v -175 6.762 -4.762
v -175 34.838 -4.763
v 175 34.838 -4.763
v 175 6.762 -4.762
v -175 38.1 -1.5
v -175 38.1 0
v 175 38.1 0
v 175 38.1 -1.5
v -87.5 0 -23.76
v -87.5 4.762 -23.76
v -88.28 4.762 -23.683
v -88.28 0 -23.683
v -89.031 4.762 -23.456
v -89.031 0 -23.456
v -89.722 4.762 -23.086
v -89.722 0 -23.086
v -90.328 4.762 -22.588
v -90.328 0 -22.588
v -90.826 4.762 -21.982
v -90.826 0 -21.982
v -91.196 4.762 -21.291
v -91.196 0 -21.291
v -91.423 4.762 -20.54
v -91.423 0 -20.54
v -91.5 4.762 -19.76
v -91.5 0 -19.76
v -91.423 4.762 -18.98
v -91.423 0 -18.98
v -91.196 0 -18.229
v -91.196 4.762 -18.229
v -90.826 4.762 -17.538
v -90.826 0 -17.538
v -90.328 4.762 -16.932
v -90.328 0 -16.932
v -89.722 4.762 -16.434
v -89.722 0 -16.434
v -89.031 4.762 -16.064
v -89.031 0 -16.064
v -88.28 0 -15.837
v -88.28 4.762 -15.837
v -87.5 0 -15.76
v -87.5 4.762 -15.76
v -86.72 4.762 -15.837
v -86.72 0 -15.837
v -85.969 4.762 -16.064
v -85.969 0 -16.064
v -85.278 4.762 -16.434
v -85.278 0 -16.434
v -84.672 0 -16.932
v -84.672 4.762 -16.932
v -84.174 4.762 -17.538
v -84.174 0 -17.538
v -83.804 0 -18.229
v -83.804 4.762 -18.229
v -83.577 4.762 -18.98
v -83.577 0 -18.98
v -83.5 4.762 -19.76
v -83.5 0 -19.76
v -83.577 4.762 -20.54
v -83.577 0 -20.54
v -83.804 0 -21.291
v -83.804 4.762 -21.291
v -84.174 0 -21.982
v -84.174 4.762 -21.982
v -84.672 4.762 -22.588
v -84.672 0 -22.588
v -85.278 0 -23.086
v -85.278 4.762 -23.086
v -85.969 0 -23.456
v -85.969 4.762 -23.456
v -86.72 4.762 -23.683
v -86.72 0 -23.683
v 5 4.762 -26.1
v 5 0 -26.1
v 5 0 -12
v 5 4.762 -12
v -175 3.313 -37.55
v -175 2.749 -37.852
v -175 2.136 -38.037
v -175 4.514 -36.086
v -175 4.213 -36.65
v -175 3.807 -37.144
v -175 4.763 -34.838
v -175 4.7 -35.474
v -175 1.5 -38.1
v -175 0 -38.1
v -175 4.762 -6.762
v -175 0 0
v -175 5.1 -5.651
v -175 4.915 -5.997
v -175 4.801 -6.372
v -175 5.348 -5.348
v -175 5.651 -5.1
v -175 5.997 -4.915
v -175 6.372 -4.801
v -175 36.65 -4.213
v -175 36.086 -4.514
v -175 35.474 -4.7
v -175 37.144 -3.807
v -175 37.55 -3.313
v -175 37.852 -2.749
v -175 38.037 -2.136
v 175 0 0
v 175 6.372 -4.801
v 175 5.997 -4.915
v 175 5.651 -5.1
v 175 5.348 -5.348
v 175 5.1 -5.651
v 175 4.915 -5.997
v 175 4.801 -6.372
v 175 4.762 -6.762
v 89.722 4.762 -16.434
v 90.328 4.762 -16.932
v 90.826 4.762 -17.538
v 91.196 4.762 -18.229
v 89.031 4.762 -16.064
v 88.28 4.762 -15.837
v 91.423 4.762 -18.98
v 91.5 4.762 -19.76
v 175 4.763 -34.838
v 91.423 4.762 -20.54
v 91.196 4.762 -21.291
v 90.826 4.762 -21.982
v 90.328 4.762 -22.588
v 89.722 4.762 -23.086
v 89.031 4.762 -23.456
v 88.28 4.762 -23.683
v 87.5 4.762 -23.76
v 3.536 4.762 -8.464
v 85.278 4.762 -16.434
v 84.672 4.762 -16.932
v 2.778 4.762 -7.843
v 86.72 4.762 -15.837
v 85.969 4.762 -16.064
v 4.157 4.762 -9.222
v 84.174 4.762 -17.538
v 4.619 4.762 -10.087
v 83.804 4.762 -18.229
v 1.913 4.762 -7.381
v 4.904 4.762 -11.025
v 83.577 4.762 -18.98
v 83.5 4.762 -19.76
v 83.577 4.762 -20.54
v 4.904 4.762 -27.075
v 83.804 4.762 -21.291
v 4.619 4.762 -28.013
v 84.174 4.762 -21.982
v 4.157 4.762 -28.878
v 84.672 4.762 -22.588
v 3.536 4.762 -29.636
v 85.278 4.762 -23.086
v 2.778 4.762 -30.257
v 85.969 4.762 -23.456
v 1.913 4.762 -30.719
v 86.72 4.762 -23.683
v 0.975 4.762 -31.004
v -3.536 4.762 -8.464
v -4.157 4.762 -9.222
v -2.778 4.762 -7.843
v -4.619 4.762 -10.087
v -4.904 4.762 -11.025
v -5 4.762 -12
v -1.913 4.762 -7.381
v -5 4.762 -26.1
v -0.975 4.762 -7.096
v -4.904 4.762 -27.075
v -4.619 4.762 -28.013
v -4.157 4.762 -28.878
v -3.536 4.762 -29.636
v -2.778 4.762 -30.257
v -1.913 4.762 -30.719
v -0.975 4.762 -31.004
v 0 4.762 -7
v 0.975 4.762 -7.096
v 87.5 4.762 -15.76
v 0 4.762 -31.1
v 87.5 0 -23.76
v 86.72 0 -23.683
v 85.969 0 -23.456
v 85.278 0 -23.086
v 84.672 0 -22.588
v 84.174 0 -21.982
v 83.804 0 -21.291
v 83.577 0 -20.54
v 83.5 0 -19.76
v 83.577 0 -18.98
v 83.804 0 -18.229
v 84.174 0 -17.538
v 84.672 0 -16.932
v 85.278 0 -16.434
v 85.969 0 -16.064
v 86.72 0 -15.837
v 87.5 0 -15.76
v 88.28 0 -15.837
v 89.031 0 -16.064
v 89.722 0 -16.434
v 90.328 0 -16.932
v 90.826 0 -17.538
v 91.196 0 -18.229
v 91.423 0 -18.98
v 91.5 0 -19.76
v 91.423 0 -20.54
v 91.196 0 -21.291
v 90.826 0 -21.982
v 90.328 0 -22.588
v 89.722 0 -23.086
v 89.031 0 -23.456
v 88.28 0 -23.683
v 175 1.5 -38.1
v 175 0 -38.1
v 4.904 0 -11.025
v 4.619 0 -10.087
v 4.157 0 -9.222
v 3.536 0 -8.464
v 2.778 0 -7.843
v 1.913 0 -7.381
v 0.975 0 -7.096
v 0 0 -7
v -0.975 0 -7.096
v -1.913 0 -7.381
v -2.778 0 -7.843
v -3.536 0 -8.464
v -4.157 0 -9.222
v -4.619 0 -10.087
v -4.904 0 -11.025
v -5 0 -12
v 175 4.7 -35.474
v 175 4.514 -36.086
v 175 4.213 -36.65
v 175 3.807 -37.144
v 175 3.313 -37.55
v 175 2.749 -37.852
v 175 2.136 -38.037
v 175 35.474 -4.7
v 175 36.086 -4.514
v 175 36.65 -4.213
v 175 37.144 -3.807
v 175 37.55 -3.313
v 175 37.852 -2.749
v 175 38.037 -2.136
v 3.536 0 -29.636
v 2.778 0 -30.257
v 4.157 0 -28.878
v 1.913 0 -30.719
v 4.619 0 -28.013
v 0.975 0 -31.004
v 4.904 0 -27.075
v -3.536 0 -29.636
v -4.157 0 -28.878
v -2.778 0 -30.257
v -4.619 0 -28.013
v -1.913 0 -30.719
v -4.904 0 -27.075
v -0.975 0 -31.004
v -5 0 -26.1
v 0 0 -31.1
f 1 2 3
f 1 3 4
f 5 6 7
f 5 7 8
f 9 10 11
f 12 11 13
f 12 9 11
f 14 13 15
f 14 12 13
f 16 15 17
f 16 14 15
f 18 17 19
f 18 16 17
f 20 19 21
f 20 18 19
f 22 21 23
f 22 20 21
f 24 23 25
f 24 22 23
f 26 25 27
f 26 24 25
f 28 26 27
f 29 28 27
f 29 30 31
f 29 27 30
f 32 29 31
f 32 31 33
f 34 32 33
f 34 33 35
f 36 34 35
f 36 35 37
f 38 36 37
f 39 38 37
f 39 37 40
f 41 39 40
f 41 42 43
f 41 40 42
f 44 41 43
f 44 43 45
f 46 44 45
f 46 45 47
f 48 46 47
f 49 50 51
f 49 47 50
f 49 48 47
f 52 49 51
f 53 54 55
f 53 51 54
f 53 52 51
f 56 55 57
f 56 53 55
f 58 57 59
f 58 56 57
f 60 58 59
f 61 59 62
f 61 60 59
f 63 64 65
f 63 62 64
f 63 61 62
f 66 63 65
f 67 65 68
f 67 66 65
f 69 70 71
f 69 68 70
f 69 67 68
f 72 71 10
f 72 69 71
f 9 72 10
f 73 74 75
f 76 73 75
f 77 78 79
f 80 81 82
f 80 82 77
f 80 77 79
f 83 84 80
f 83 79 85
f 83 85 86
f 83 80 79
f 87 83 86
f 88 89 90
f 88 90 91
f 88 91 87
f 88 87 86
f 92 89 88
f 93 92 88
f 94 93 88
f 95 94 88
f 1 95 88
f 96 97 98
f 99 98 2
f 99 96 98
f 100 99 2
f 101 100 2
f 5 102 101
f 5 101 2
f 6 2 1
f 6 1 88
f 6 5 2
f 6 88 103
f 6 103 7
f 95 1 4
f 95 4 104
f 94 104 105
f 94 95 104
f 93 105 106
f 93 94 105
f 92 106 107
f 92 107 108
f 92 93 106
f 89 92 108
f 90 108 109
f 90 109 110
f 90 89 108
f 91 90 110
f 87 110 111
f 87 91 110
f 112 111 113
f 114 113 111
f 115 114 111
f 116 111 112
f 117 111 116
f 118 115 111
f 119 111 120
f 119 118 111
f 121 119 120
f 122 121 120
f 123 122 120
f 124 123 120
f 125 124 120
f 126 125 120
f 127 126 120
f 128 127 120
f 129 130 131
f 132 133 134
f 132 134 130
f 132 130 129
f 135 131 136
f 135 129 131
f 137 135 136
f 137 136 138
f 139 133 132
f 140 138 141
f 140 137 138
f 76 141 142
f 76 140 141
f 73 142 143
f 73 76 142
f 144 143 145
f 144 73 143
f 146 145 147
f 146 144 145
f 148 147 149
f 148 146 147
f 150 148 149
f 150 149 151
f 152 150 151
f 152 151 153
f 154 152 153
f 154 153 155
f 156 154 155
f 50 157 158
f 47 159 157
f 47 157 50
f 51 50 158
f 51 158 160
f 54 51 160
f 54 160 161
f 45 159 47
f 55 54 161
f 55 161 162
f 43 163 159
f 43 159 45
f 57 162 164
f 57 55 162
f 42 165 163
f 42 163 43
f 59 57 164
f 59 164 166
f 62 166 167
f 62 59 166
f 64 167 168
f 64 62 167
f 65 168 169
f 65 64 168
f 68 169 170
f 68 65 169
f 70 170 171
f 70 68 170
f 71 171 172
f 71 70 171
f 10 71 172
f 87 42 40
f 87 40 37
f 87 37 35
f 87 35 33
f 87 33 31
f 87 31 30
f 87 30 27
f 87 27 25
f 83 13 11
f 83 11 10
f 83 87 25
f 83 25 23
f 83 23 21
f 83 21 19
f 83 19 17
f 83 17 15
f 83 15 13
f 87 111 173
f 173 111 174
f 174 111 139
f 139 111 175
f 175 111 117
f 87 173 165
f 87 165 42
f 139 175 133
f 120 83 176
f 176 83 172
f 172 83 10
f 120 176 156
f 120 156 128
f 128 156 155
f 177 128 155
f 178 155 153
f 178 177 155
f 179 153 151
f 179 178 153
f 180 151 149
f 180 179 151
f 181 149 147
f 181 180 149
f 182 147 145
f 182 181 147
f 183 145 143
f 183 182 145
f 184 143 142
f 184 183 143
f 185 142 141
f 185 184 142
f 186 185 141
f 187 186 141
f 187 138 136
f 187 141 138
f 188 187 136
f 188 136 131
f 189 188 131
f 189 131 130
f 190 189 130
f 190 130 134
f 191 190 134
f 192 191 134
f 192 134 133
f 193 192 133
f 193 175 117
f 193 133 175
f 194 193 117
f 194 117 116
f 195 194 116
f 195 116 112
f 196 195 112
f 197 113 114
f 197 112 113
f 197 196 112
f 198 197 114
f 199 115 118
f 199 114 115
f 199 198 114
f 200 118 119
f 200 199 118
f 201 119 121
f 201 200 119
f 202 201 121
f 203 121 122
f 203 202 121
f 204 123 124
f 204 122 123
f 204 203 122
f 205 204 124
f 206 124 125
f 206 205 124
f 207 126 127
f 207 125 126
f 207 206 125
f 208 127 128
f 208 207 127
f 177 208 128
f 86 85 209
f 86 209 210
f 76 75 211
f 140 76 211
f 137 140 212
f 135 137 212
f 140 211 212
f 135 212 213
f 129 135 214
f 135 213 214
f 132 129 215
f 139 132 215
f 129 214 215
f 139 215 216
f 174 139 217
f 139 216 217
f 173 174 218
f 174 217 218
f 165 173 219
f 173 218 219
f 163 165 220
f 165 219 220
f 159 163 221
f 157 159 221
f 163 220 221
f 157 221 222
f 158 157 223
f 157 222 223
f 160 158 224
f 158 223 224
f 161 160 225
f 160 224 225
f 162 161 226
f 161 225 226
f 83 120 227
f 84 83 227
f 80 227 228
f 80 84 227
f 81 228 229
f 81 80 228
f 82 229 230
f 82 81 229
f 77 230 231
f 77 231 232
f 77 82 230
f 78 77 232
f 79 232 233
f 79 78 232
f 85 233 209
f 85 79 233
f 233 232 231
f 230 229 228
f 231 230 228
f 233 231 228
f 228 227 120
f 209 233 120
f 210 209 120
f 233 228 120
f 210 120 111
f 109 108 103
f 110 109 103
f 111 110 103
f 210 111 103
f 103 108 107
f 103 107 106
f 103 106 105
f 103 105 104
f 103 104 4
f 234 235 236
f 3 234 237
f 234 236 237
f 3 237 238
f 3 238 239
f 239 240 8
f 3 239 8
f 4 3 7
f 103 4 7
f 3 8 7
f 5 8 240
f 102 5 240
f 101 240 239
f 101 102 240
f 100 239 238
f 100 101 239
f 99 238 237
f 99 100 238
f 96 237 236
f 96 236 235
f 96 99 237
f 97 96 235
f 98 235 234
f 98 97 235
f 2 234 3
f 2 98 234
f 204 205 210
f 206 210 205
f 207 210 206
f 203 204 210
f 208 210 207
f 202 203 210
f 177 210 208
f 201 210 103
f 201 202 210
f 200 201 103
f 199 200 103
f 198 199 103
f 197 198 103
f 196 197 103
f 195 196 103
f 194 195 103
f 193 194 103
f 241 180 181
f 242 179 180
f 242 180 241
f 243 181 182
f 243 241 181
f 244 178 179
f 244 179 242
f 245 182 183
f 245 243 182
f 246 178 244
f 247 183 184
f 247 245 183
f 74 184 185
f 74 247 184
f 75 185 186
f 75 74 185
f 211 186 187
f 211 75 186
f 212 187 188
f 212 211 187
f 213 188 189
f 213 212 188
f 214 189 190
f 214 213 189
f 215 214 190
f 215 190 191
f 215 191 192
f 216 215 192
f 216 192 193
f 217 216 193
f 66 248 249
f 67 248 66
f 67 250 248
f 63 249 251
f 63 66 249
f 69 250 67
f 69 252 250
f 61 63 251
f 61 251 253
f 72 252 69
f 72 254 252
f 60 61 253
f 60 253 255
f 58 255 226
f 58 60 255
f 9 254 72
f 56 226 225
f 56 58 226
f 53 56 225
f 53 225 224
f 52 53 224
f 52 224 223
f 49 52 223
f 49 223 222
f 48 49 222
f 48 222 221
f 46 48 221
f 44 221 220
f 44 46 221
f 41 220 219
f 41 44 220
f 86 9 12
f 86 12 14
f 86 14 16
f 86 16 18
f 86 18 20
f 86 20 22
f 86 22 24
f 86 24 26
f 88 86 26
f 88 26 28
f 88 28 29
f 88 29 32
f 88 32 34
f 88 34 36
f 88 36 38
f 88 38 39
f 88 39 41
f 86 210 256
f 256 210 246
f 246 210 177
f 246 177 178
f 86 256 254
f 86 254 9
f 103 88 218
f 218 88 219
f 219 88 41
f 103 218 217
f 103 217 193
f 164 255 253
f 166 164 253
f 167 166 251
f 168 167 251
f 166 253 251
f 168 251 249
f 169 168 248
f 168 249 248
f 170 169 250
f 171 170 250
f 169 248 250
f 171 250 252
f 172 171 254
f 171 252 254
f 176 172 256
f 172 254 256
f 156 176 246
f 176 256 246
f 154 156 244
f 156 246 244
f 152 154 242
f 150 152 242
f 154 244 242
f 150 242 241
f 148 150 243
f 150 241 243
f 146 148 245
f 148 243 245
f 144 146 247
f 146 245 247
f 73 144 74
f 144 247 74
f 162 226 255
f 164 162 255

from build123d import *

# Parameters (mm, degrees)
A_O_CANTONEIRA_LAMINADA_1020_3_16X1_1_2_DEPTH = 350
ESBO_O4_R                                     = 4
CORTE_EXTRUS_O1_DEPTH                         = 184.107127114


with BuildPart() as part:
    # Sketch11 → Aço cantoneira laminada 1020 3-16X1-1-2(1) (new body)
    with BuildSketch(Plane(origin=(-175, 0, 0), x_dir=(0, 0, -1), z_dir=(1, 0, 0))):
        with BuildLine():
            Line((0, 0), (0, 38.1))
            Line((0, 38.1), (1.5, 38.1))
            ThreePointArc((1.5, 38.1), (3.806935874, 37.144435874), (4.7625, 34.8375))
            Line((4.7625, 34.8375), (4.7625, 6.7625))
            ThreePointArc((4.7625, 6.7625), (5.348286438, 5.348286438), (6.7625, 4.7625))
            Line((6.7625, 4.7625), (34.8375, 4.7625))
            ThreePointArc((34.8375, 4.7625), (37.144435874, 3.806935874), (38.1, 1.5))
            Line((38.1, 1.5), (38.1, 0))
            Line((38.1, 0), (0, 0))
        make_face()
    extrude(amount=A_O_CANTONEIRA_LAMINADA_1020_3_16X1_1_2_DEPTH)

    # Esboço4 → Corte-extrusão1 (cut, through all)
    with BuildSketch(Plane(origin=(0, 0, 0), x_dir=(1, 0, 0), z_dir=(0, 1, 0))):
        with Locations(Location((-87.5, 19.76, 0), (0, 0, 90))):
            Circle(ESBO_O4_R)
        with Locations(Location((87.5, 19.76, 0), (0, 0, 90))):
            Circle(ESBO_O4_R)
        with BuildLine():
            Line((-5, 12), (-5, 26.1))
            ThreePointArc((-5, 26.1), (0, 31.1), (5, 26.1))
            Line((5, 26.1), (5, 12))
            ThreePointArc((5, 12), (0, 7), (-5, 12))
        make_face()
    extrude(amount=CORTE_EXTRUS_O1_DEPTH, mode=Mode.SUBTRACT)


solid = part.part
